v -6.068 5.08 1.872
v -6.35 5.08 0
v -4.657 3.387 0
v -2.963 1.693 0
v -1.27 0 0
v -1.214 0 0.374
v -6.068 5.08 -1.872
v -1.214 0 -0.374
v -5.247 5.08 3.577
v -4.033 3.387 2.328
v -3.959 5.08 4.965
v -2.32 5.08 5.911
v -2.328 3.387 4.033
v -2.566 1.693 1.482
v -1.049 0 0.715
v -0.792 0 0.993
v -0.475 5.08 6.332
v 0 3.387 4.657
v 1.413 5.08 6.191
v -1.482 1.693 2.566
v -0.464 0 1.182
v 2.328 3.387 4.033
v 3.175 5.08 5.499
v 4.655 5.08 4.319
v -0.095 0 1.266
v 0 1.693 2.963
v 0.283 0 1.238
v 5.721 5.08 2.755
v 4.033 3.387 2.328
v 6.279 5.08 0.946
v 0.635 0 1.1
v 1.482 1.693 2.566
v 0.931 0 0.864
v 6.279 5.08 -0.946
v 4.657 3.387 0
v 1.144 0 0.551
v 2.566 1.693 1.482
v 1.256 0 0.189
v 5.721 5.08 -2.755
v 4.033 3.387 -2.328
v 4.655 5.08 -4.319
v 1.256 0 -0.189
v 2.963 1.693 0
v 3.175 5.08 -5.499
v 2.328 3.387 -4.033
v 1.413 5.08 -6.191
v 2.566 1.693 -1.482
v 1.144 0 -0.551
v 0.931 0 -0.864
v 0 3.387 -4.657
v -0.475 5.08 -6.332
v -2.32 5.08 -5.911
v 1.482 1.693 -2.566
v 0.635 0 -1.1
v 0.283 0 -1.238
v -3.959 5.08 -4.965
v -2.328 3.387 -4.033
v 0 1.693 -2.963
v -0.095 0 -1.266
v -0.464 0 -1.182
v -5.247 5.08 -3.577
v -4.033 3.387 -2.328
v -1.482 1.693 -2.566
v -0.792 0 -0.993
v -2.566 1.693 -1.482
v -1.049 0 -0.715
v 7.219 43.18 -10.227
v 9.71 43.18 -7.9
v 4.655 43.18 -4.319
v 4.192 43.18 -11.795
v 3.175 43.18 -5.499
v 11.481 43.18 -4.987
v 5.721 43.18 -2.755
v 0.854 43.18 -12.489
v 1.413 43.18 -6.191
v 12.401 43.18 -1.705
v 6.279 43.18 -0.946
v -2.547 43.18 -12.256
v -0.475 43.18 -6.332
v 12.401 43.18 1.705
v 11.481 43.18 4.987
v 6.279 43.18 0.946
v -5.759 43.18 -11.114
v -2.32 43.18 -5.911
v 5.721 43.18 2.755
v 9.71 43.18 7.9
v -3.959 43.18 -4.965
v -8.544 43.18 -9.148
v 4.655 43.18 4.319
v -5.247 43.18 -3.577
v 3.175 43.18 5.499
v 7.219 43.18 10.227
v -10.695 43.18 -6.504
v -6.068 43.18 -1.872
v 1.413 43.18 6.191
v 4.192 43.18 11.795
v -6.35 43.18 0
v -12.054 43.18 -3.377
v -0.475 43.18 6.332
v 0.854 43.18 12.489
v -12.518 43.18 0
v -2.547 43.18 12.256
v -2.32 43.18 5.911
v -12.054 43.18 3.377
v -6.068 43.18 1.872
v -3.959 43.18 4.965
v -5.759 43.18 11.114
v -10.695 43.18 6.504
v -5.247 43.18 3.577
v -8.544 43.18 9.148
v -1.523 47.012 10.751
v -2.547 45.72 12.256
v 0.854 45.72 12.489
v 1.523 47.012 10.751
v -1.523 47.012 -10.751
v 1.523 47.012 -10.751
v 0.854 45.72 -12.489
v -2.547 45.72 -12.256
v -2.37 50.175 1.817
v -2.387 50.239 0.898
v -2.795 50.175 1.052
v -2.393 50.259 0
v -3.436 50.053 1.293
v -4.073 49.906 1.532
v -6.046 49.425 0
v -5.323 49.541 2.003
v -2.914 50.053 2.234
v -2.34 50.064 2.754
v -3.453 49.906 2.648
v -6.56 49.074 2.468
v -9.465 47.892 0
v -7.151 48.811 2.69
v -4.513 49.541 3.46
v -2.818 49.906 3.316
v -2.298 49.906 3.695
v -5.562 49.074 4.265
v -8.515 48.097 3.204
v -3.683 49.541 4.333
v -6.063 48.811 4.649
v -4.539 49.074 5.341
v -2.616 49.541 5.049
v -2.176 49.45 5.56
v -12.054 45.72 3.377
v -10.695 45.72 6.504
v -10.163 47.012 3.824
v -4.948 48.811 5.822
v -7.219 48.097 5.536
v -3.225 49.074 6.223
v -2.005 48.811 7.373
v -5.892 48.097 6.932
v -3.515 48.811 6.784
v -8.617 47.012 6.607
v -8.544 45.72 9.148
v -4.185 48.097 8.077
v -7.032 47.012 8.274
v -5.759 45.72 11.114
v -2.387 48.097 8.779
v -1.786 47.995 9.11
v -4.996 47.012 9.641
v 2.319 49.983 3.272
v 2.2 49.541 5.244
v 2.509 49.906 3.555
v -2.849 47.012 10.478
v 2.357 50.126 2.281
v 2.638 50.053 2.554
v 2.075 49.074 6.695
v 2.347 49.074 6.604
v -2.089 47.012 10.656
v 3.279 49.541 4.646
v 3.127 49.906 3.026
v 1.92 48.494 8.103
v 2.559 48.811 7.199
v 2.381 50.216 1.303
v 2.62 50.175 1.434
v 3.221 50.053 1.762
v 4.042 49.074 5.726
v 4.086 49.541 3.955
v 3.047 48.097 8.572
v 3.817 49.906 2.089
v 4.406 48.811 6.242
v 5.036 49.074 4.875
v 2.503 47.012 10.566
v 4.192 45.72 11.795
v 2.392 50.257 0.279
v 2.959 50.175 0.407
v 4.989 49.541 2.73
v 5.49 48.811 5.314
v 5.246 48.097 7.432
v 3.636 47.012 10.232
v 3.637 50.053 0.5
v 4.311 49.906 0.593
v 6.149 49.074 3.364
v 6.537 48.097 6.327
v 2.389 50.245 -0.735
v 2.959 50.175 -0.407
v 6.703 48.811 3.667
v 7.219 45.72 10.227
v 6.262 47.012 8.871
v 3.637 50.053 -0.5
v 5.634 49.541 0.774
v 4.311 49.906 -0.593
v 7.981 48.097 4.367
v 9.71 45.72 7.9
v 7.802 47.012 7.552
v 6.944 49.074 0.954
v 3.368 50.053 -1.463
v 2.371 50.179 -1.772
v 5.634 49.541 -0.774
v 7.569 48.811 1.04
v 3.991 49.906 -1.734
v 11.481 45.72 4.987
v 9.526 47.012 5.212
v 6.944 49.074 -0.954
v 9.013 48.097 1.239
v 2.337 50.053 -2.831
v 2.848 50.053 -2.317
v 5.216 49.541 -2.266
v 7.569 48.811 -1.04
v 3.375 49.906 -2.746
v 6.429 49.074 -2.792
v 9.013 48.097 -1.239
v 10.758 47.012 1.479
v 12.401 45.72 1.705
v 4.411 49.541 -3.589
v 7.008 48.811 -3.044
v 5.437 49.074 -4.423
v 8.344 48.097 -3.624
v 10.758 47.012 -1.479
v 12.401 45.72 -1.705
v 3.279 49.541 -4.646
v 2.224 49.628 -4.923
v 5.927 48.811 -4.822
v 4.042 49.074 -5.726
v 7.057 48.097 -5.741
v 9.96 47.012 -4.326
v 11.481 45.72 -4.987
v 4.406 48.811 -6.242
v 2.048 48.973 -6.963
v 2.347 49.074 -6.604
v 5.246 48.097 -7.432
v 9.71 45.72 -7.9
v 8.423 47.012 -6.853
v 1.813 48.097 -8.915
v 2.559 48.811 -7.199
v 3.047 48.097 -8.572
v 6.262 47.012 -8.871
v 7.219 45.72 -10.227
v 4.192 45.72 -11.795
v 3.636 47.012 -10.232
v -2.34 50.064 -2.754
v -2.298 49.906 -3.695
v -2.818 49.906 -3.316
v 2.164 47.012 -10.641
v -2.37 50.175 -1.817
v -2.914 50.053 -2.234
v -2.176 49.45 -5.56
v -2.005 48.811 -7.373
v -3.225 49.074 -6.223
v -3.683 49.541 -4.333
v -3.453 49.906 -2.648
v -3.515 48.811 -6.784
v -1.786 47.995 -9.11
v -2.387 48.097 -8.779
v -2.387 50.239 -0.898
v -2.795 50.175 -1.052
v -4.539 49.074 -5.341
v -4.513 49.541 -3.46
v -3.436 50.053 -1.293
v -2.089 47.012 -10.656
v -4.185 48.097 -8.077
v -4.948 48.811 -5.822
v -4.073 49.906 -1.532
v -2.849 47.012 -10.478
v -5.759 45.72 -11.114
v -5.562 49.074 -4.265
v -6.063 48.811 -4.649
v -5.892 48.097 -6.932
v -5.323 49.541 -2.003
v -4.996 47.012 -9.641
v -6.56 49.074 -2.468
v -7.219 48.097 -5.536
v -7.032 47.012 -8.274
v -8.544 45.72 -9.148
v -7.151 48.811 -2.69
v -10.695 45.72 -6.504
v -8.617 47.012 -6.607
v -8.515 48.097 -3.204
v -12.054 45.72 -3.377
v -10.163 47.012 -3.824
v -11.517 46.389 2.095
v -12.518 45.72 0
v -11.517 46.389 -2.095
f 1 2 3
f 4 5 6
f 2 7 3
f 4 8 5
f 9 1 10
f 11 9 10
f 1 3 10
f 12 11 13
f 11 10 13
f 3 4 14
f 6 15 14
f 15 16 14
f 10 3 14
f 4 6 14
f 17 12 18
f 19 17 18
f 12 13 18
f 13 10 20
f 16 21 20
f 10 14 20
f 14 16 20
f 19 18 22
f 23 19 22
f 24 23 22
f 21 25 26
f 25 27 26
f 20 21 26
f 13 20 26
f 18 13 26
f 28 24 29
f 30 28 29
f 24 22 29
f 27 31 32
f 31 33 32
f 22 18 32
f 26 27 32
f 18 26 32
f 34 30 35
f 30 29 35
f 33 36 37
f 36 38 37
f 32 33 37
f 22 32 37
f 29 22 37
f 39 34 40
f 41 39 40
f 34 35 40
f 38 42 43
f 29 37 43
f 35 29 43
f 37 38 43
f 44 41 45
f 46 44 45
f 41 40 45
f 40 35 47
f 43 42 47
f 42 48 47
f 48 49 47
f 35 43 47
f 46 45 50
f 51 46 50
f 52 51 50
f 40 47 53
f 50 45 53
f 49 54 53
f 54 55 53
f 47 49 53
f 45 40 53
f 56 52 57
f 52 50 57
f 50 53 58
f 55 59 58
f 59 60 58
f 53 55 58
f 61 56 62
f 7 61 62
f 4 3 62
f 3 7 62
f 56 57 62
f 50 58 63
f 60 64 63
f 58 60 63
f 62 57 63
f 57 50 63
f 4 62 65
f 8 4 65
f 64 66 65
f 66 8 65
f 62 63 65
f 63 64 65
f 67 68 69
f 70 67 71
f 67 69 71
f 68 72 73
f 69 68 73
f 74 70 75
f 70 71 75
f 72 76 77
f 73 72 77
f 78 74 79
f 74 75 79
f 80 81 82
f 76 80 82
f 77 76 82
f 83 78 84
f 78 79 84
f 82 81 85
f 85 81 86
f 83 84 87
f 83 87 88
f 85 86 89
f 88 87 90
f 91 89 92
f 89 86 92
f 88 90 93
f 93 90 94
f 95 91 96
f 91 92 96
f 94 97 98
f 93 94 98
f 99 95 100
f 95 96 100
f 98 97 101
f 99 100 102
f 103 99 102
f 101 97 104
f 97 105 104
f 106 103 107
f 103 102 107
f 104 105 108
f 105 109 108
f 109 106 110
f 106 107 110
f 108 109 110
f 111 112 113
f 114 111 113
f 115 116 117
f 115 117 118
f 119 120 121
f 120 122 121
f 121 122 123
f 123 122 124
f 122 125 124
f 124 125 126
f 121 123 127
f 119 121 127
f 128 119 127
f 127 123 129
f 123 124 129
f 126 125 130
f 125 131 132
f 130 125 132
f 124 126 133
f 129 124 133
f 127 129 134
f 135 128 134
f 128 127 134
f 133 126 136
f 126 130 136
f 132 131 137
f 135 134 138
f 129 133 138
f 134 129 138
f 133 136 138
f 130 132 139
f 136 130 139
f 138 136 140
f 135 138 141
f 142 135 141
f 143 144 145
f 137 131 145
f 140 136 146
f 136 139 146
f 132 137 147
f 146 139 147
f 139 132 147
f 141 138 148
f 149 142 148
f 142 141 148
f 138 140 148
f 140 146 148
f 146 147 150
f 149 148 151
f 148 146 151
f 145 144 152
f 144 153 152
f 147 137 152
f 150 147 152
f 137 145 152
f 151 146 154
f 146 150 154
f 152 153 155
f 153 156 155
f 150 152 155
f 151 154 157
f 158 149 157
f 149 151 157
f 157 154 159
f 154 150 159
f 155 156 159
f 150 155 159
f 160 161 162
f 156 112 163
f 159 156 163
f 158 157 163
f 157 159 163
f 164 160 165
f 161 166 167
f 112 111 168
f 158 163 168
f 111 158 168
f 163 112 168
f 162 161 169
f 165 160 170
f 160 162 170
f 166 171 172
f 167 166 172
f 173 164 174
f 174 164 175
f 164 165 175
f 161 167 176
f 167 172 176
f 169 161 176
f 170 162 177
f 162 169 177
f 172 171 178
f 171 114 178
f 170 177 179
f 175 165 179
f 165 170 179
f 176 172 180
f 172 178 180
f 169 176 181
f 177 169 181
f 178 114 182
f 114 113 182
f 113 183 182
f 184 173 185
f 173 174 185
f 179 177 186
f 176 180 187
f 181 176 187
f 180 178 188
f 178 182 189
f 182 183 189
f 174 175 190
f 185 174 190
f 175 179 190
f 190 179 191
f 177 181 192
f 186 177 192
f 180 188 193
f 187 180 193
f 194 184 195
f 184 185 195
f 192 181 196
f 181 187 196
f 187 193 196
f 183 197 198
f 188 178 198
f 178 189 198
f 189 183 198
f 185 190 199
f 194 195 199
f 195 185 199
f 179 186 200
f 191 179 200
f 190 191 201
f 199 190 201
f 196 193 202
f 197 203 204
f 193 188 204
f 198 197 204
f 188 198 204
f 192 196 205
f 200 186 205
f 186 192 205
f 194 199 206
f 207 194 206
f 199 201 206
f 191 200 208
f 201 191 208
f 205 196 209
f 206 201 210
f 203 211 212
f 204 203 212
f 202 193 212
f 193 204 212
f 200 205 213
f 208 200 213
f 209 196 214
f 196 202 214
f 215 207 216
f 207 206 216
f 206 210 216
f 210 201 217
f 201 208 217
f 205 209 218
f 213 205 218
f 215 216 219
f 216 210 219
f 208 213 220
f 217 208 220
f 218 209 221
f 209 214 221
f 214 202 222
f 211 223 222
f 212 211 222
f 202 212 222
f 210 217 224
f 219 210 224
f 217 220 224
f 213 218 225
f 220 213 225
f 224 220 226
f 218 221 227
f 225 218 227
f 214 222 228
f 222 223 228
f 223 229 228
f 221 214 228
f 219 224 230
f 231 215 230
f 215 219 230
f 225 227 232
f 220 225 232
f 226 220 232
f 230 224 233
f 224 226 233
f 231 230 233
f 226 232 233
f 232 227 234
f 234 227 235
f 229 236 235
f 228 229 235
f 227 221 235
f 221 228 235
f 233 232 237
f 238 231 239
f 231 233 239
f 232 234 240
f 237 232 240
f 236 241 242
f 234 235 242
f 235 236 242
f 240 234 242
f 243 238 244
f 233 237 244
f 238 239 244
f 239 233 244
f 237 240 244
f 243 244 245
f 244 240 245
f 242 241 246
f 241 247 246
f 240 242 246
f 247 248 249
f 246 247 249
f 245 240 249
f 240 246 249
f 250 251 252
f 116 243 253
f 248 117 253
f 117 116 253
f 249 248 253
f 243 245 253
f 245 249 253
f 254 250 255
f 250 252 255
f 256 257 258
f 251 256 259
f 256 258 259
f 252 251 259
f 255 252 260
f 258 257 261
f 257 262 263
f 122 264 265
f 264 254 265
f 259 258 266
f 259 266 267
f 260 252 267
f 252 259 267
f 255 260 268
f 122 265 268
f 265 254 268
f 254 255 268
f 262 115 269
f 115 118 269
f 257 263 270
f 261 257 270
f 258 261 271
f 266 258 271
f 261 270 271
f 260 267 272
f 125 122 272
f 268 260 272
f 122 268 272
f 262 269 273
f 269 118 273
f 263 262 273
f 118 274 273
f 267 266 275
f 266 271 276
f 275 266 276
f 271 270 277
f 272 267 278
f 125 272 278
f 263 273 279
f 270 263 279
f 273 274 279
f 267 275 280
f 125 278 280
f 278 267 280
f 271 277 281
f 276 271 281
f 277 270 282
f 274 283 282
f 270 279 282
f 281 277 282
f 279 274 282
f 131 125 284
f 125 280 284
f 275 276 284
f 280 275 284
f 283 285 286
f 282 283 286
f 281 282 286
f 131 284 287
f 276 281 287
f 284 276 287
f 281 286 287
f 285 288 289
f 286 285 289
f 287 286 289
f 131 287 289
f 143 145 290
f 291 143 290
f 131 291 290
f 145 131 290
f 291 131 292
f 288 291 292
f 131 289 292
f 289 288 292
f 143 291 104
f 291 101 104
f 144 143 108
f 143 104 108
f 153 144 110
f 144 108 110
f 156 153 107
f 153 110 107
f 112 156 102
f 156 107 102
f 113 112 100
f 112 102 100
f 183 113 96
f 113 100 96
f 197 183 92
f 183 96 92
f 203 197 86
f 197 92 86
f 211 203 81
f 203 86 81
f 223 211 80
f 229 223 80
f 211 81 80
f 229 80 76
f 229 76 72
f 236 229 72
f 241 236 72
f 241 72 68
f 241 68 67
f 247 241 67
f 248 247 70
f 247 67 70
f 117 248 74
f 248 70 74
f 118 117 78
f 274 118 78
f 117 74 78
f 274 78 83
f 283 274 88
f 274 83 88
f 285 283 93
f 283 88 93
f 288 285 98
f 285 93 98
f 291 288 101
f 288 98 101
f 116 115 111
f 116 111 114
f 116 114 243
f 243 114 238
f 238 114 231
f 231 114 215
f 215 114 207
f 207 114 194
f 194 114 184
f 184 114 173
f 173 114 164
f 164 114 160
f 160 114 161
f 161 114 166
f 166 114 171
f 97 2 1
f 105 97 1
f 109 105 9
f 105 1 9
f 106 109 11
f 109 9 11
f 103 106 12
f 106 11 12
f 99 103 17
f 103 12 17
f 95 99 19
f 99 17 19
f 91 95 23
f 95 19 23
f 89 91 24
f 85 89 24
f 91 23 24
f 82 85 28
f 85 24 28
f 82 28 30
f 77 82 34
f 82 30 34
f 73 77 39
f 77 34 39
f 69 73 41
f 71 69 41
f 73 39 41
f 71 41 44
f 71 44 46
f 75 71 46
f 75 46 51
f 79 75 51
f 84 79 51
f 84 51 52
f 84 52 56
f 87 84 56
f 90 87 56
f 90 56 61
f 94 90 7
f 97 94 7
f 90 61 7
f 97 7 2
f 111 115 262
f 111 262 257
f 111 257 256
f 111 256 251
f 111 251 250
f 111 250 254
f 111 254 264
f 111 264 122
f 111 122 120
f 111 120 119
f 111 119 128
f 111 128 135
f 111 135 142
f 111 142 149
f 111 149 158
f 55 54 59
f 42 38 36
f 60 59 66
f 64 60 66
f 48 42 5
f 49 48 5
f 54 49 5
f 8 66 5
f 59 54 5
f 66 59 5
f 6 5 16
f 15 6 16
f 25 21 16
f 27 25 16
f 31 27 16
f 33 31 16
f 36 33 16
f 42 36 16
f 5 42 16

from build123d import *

# Parameters (mm, degrees)
CHAMFER4_SIZE           = 5.08
CUT_EXTRUDE2_DEPTH      = 13.517807
CUT_EXTRUDE2_DEPTH_BACK = 13.517807


with BuildPart() as part:
    # Sketch1 one side → Revolve13 (revolve)
    with BuildSketch(Plane.XY):
        Polygon((-6.35, 43.18), (-6.35, 0), (0, 0), (0, 45.72), (-12.517807, 45.72), (-12.517807, 43.18), align=None)
        with BuildLine():
            ThreePointArc((0, 50.41009), (-6.683794, 49.199075), (-12.517807, 45.72))
            Line((-12.517807, 45.72), (0, 45.72))
            Line((0, 45.72), (0, 50.41009))
        make_face()
    revolve(axis=Axis((0, -10.13615, 0), (0, 1, 0)))

    # Chamfer4
    chamfer4_edges = [part.edges().sort_by_distance(p)[0] for p in [
        (6.35, 0, 0),
    ]]
    chamfer(chamfer4_edges, length=CHAMFER4_SIZE)

    # Sketch4 → Cut-Extrude2 (cut, two sides)
    with BuildSketch(Plane.XY) as cut_extrude2_sk:
        Polygon((-32.117638, 161.194555), (-2.39261, 50.259241), (-1.522582, 47.012254), (1.522582, 47.012254), (2.39261, 50.259241), (32.117638, 161.194555), (32.117638, 390.891931), (-32.117638, 390.891931), align=None)
    extrude(amount=CUT_EXTRUDE2_DEPTH, mode=Mode.SUBTRACT)
    extrude(cut_extrude2_sk.sketch, amount=-CUT_EXTRUDE2_DEPTH_BACK, mode=Mode.SUBTRACT)


solid = part.part
